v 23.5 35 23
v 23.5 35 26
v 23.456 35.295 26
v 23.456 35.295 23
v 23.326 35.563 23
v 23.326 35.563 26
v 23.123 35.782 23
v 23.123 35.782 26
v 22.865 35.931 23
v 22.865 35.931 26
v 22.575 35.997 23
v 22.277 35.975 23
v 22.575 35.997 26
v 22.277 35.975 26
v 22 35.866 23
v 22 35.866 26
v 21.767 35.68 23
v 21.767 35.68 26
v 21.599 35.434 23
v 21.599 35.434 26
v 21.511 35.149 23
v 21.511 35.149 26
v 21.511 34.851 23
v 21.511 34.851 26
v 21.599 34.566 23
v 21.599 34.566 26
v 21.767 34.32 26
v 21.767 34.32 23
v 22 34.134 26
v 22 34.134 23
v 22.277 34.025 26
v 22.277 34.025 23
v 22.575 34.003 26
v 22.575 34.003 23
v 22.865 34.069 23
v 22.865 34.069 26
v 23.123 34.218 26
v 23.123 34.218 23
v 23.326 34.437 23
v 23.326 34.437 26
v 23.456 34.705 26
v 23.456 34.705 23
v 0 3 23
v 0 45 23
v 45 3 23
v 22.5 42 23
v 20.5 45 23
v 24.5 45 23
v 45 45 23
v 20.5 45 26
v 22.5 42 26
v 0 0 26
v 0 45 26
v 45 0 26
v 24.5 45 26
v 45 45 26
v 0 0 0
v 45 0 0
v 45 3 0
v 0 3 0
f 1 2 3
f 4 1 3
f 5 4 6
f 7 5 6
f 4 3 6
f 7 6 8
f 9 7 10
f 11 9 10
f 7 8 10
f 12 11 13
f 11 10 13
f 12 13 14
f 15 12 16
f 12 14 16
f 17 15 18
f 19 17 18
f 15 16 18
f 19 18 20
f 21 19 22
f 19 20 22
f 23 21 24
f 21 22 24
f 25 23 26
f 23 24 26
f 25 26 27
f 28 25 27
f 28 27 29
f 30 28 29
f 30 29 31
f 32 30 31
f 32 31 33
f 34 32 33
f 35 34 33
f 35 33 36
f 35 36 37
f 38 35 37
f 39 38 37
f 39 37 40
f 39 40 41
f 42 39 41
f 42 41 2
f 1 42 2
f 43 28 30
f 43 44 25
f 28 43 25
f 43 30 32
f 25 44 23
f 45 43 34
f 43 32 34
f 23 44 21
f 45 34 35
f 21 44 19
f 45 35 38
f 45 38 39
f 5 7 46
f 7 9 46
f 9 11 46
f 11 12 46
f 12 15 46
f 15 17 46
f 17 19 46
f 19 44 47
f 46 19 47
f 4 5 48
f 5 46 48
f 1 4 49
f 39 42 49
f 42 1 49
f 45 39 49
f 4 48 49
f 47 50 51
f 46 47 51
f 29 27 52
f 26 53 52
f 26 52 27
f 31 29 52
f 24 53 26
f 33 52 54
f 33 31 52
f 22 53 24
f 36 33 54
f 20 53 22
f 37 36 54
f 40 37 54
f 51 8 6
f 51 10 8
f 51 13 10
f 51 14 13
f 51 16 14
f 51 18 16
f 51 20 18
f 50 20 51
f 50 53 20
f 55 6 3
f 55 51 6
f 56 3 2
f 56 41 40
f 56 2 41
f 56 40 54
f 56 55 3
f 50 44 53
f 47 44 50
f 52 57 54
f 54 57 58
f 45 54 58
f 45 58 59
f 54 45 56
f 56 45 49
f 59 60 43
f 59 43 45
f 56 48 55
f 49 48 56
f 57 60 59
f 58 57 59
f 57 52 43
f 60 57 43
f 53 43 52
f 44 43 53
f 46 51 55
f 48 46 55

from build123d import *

# Parameters (mm, degrees)
SKETCH001_W     = 45
SKETCH001_H     = 42
PAD001_DEPTH    = 26
SKETCH_W        = 45
SKETCH_H        = 45
PAD_DEPTH       = 26
SKETCH002_R     = 1
POCKET_DEPTH    = 26.001
POCKET001_DEPTH = 5


with BuildPart() as batoque:
    # Sketch001 → Pad001 (new body)
    with BuildSketch(Plane.XY):
        with Locations((22.5, 21)):
            Rectangle(SKETCH001_W, SKETCH001_H)
    extrude(amount=PAD001_DEPTH)


with BuildPart() as batoque_1:
    # Body001 placement: moved
    add(batoque.part.moved(Location((0, 3, -3))))


with BuildPart() as gabarito:
    # Sketch → Pad (new body)
    with BuildSketch(Plane.XY):
        with Locations((22.5, 22.5)):
            Rectangle(SKETCH_W, SKETCH_H)
    extrude(amount=PAD_DEPTH)

    # Sketch002 → Pocket (cut, through all)
    with BuildSketch(Plane.XY.offset(26)):
        with Locations((22.5, 35)):
            Circle(SKETCH002_R)
    extrude(amount=-POCKET_DEPTH, mode=Mode.SUBTRACT)

    # Boolean: cut Batoque
    add(batoque_1.part, mode=Mode.SUBTRACT)

    # Sketch003 (on Face4 of Boolean) → Pocket001 (cut)
    with BuildSketch(Plane.XY.offset(26)):
        Polygon((20.5, 45), (22.5, 42), (24.5, 45), align=None)
    extrude(amount=-POCKET001_DEPTH, mode=Mode.SUBTRACT)


solid = gabarito.part
